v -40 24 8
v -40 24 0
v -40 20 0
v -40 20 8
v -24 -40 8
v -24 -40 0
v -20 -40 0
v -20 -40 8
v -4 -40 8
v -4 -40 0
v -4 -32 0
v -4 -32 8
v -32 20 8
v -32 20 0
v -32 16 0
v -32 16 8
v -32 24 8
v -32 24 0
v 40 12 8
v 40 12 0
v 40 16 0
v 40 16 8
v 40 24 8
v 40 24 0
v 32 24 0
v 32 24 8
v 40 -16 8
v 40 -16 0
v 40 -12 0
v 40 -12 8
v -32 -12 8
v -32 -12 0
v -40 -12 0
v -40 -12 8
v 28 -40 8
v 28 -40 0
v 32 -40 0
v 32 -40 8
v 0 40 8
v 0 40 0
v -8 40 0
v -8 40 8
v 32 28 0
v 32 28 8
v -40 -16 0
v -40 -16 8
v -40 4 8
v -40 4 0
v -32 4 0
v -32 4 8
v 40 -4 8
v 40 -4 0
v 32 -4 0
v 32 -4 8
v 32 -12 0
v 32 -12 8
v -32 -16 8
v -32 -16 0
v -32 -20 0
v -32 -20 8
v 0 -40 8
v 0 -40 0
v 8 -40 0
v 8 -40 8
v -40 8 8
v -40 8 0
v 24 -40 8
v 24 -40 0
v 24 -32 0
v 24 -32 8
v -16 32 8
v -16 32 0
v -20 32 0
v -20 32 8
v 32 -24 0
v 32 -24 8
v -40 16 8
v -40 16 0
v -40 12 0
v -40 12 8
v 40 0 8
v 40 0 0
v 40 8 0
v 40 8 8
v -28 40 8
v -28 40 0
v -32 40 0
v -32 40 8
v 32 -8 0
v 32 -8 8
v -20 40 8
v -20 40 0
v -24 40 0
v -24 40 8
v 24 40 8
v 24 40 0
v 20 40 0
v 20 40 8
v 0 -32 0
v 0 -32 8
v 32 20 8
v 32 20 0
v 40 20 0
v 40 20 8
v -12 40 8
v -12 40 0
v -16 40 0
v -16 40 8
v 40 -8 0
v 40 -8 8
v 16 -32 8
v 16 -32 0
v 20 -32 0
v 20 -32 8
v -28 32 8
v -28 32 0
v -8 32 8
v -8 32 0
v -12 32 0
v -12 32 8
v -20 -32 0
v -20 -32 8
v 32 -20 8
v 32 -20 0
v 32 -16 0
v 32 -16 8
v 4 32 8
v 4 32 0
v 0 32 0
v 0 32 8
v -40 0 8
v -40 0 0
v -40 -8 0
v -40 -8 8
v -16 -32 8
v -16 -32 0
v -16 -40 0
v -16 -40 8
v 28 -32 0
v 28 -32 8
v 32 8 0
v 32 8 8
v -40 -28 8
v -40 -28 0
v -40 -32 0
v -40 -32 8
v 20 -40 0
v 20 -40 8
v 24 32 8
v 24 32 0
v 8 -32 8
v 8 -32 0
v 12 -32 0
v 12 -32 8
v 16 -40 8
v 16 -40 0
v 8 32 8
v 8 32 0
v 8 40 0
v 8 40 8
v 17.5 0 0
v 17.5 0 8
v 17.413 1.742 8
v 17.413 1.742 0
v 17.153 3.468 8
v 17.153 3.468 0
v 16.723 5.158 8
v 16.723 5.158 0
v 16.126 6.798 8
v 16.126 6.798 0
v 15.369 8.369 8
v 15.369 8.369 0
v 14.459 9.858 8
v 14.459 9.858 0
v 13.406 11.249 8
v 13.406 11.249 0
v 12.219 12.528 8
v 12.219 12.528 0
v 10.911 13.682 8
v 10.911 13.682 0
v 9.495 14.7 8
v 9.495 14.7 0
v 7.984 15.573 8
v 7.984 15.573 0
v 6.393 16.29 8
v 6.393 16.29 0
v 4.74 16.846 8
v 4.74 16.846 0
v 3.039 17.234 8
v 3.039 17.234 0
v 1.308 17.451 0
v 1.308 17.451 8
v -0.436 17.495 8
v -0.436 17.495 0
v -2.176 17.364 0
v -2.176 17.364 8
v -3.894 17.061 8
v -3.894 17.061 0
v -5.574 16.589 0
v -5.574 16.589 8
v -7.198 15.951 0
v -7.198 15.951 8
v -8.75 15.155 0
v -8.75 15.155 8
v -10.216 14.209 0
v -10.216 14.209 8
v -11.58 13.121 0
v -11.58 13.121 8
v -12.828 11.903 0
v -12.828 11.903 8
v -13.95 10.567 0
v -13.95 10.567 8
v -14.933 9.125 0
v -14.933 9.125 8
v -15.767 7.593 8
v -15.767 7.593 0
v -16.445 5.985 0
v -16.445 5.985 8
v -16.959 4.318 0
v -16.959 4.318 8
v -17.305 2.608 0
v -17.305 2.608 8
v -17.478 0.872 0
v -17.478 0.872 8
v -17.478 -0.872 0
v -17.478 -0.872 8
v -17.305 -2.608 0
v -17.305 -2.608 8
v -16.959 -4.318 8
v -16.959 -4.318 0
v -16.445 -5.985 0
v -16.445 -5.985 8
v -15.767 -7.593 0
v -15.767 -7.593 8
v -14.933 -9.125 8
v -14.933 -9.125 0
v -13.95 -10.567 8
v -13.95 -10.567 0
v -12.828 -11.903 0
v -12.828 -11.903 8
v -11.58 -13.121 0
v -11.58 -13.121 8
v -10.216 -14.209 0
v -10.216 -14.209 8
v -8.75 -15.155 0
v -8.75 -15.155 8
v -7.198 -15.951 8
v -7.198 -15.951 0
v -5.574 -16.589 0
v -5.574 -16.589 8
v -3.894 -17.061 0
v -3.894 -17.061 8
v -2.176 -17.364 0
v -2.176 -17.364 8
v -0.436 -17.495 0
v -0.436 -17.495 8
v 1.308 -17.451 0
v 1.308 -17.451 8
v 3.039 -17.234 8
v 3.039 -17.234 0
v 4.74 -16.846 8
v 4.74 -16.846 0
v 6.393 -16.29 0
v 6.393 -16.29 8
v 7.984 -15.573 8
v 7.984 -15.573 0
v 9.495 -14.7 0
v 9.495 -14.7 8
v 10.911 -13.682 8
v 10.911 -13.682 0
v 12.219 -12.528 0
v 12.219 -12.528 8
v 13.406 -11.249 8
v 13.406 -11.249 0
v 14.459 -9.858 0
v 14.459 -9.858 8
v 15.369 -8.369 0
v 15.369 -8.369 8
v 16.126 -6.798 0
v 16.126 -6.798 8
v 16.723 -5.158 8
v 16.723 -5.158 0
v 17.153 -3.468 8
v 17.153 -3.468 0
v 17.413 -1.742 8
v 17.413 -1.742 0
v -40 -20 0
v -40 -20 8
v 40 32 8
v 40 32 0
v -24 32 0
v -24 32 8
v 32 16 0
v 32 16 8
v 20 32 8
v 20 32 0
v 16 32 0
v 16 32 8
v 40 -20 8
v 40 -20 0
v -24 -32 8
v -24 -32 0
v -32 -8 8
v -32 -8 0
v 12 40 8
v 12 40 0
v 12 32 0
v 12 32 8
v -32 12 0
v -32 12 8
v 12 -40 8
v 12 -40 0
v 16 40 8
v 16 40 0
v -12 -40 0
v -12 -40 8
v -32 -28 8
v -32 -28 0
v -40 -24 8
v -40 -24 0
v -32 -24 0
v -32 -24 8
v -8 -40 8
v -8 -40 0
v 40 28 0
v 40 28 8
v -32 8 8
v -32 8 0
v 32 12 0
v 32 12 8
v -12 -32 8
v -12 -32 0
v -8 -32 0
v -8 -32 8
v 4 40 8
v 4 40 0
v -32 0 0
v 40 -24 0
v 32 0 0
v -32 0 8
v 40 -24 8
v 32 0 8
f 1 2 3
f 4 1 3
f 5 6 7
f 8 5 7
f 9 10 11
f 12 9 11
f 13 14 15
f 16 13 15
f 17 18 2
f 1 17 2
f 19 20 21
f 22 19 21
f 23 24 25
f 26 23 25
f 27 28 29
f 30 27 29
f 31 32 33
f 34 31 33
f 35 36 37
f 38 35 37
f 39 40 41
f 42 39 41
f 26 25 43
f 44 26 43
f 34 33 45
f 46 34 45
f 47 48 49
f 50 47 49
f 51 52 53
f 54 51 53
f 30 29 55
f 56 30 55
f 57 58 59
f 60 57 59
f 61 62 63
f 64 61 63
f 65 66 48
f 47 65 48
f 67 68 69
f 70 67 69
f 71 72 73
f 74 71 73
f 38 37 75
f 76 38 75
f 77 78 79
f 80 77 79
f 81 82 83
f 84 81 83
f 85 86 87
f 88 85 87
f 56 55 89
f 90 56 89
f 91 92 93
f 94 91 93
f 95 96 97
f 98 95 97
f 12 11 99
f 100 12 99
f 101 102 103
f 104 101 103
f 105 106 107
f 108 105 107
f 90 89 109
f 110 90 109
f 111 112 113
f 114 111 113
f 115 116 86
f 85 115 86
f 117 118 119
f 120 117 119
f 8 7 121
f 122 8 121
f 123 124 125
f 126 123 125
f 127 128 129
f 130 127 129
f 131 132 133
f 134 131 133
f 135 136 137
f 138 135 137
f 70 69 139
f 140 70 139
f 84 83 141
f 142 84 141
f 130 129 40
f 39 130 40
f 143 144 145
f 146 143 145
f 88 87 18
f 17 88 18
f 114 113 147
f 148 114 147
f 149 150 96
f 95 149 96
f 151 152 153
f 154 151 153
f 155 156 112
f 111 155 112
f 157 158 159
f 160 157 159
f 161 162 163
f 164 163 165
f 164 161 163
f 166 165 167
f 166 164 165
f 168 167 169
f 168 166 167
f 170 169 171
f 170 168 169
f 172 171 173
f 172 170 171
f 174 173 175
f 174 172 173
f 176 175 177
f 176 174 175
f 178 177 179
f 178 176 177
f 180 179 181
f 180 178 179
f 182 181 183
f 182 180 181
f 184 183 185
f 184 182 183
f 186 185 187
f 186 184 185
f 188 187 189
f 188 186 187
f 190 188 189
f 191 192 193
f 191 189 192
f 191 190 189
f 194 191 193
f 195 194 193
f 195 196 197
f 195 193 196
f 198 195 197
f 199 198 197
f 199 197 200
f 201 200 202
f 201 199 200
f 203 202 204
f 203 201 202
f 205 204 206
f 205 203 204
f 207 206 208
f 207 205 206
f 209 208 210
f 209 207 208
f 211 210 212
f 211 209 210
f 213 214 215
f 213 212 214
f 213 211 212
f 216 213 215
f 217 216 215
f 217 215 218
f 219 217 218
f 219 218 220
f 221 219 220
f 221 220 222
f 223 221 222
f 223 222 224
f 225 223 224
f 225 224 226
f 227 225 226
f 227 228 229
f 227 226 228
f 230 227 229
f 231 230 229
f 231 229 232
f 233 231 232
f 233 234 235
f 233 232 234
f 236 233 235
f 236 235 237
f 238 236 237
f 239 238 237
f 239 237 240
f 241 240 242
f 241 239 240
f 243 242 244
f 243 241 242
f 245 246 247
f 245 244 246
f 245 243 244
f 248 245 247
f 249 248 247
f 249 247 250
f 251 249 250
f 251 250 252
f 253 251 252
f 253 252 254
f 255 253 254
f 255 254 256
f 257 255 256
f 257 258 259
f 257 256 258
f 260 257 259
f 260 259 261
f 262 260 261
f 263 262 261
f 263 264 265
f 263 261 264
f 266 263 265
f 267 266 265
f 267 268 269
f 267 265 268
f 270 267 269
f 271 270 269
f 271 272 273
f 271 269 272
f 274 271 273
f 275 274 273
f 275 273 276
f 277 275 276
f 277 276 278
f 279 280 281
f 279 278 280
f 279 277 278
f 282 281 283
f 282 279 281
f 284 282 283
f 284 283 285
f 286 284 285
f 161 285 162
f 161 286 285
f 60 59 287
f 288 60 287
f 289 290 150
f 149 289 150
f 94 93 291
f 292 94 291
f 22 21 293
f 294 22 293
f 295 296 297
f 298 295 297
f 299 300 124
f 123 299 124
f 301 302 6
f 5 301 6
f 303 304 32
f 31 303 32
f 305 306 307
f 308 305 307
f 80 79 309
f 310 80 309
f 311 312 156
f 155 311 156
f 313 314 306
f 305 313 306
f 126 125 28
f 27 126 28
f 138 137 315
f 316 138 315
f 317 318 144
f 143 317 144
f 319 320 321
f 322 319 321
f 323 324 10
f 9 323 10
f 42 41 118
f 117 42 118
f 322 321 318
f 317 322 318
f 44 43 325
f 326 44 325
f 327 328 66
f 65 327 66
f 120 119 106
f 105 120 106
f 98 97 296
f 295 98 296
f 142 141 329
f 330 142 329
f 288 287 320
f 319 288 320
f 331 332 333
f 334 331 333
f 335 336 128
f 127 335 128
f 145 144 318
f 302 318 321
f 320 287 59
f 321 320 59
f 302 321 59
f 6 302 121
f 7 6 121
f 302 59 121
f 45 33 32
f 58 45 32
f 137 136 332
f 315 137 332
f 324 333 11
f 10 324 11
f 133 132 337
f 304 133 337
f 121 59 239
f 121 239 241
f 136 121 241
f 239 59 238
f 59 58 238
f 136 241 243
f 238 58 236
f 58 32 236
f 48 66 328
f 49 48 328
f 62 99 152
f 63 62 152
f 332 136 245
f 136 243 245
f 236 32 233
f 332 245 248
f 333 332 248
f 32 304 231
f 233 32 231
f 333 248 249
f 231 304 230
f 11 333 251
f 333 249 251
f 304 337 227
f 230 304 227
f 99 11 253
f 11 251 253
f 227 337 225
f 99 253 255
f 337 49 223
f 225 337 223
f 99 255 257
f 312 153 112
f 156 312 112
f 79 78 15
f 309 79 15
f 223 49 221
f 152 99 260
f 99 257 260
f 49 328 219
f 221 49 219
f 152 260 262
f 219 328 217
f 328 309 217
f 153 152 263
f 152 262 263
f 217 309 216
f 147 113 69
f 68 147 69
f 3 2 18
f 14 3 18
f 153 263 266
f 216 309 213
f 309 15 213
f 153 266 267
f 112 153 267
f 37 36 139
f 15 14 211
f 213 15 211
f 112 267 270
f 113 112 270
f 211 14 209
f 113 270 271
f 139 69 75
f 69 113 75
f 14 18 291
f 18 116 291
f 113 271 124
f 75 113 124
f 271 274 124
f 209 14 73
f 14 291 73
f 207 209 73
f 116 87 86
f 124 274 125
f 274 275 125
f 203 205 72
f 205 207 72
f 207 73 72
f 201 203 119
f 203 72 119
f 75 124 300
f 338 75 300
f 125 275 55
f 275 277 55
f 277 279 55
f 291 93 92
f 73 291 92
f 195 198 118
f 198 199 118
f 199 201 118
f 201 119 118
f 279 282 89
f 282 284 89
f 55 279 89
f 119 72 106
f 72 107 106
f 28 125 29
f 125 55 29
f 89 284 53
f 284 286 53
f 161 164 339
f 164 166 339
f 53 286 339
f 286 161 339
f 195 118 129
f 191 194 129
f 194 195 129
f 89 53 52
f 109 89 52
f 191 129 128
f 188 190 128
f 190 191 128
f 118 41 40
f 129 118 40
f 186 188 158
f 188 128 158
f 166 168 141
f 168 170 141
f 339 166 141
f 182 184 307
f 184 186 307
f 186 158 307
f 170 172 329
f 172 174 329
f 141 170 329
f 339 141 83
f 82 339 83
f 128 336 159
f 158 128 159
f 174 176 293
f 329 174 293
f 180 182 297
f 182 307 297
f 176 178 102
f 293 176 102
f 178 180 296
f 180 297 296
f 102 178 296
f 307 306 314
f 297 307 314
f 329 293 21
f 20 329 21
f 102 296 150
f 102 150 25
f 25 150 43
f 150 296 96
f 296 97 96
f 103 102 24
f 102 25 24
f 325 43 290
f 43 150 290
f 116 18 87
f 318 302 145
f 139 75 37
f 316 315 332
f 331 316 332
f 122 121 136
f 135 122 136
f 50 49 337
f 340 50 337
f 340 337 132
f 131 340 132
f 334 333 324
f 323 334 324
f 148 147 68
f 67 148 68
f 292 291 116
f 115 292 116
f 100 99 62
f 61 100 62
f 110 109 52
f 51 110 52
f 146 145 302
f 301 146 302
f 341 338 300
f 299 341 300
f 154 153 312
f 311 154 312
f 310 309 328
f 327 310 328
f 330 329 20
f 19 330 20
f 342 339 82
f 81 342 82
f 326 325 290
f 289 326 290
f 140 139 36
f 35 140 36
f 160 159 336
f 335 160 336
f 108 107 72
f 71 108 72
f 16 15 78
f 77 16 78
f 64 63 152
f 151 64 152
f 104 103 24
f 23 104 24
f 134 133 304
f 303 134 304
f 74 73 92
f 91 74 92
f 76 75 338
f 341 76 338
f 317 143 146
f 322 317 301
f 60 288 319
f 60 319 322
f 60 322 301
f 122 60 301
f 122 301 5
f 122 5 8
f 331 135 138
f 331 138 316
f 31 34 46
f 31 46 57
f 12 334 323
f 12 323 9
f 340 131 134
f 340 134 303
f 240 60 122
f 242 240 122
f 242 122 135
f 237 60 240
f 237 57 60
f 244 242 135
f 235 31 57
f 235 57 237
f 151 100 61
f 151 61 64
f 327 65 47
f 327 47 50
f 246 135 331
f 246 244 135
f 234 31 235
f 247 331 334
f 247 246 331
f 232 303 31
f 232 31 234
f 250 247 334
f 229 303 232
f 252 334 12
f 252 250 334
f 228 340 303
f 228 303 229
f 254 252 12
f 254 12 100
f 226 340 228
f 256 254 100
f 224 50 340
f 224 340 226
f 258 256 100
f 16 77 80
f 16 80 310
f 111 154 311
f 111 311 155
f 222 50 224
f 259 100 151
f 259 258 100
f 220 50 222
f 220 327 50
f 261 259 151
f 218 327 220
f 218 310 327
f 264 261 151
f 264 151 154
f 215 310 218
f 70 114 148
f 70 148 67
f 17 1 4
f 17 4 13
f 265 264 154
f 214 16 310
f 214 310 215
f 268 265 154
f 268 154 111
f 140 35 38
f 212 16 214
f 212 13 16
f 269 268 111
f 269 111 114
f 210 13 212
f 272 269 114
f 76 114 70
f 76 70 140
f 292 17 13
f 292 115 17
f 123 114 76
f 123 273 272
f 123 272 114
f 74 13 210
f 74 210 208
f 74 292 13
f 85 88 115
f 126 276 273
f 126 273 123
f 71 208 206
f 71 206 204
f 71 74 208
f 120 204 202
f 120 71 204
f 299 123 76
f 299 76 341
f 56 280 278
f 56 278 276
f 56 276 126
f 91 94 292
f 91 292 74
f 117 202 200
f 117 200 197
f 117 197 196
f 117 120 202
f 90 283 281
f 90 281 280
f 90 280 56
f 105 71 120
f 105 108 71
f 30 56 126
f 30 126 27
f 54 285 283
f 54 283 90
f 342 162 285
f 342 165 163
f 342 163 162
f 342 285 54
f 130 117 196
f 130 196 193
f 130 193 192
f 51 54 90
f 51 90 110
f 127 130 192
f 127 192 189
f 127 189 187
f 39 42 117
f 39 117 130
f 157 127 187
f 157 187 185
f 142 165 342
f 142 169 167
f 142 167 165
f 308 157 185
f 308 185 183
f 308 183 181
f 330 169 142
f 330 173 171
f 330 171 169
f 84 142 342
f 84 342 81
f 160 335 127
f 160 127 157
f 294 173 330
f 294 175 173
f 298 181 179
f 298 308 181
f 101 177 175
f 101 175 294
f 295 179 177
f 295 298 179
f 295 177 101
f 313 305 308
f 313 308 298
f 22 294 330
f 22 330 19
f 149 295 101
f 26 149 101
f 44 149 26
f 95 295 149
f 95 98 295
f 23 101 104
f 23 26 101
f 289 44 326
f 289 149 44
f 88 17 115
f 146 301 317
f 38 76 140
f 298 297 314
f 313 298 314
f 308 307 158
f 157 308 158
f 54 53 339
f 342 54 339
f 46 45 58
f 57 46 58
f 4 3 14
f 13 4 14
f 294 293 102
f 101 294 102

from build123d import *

# Parameters (mm, degrees)
BOSS_EXTRU_1_DEPTH      = 8
ESQUISSE2_R             = 17.5
ENL_V_MAT_EXTRU_1_DEPTH = 58.131427428


with BuildPart() as part:
    # Esquisse1 → Boss.-Extru.1 (new body)
    with BuildSketch(Plane.XY):
        Polygon((40, 28), (40, 32), (24, 32), (24, 40), (20, 40), (20, 32), (16, 32), (16, 40), (12, 40), (12, 32), (8, 32), (8, 40), (4, 40), (4, 32), (0, 32), (0, 40), (-8, 40), (-8, 32), (-12, 32), (-12, 40), (-16, 40), (-16, 32), (-20, 32), (-20, 40), (-24, 40), (-24, 32), (-28, 32), (-28, 40), (-32, 40), (-32, 24), (-40, 24), (-40, 20), (-32, 20), (-32, 16), (-40, 16), (-40, 12), (-32, 12), (-32, 8), (-40, 8), (-40, 4), (-32, 4), (-32, 0), (-40, 0), (-40, -8), (-32, -8), (-32, -12), (-40, -12), (-40, -16), (-32, -16), (-32, -20), (-40, -20), (-40, -24), (-32, -24), (-32, -28), (-40, -28), (-40, -32), (-24, -32), (-24, -40), (-20, -40), (-20, -32), (-16, -32), (-16, -40), (-12, -40), (-12, -32), (-8, -32), (-8, -40), (-4, -40), (-4, -32), (0, -32), (0, -40), (8, -40), (8, -32), (12, -32), (12, -40), (16, -40), (16, -32), (20, -32), (20, -40), (24, -40), (24, -32), (28, -32), (28, -40), (32, -40), (32, -24), (40, -24), (40, -20), (32, -20), (32, -16), (40, -16), (40, -12), (32, -12), (32, -8), (40, -8), (40, -4), (32, -4), (32, 0), (40, 0), (40, 8), (32, 8), (32, 12), (40, 12), (40, 16), (32, 16), (32, 20), (40, 20), (40, 24), (32, 24), (32, 28), align=None)
    extrude(amount=BOSS_EXTRU_1_DEPTH)

    # Esquisse2 → Enlèv. mat.-Extru.1 (cut, through all)
    with BuildSketch(Plane.XY):
        Circle(ESQUISSE2_R)
    extrude(amount=ENL_V_MAT_EXTRU_1_DEPTH, mode=Mode.SUBTRACT)


solid = part.part
